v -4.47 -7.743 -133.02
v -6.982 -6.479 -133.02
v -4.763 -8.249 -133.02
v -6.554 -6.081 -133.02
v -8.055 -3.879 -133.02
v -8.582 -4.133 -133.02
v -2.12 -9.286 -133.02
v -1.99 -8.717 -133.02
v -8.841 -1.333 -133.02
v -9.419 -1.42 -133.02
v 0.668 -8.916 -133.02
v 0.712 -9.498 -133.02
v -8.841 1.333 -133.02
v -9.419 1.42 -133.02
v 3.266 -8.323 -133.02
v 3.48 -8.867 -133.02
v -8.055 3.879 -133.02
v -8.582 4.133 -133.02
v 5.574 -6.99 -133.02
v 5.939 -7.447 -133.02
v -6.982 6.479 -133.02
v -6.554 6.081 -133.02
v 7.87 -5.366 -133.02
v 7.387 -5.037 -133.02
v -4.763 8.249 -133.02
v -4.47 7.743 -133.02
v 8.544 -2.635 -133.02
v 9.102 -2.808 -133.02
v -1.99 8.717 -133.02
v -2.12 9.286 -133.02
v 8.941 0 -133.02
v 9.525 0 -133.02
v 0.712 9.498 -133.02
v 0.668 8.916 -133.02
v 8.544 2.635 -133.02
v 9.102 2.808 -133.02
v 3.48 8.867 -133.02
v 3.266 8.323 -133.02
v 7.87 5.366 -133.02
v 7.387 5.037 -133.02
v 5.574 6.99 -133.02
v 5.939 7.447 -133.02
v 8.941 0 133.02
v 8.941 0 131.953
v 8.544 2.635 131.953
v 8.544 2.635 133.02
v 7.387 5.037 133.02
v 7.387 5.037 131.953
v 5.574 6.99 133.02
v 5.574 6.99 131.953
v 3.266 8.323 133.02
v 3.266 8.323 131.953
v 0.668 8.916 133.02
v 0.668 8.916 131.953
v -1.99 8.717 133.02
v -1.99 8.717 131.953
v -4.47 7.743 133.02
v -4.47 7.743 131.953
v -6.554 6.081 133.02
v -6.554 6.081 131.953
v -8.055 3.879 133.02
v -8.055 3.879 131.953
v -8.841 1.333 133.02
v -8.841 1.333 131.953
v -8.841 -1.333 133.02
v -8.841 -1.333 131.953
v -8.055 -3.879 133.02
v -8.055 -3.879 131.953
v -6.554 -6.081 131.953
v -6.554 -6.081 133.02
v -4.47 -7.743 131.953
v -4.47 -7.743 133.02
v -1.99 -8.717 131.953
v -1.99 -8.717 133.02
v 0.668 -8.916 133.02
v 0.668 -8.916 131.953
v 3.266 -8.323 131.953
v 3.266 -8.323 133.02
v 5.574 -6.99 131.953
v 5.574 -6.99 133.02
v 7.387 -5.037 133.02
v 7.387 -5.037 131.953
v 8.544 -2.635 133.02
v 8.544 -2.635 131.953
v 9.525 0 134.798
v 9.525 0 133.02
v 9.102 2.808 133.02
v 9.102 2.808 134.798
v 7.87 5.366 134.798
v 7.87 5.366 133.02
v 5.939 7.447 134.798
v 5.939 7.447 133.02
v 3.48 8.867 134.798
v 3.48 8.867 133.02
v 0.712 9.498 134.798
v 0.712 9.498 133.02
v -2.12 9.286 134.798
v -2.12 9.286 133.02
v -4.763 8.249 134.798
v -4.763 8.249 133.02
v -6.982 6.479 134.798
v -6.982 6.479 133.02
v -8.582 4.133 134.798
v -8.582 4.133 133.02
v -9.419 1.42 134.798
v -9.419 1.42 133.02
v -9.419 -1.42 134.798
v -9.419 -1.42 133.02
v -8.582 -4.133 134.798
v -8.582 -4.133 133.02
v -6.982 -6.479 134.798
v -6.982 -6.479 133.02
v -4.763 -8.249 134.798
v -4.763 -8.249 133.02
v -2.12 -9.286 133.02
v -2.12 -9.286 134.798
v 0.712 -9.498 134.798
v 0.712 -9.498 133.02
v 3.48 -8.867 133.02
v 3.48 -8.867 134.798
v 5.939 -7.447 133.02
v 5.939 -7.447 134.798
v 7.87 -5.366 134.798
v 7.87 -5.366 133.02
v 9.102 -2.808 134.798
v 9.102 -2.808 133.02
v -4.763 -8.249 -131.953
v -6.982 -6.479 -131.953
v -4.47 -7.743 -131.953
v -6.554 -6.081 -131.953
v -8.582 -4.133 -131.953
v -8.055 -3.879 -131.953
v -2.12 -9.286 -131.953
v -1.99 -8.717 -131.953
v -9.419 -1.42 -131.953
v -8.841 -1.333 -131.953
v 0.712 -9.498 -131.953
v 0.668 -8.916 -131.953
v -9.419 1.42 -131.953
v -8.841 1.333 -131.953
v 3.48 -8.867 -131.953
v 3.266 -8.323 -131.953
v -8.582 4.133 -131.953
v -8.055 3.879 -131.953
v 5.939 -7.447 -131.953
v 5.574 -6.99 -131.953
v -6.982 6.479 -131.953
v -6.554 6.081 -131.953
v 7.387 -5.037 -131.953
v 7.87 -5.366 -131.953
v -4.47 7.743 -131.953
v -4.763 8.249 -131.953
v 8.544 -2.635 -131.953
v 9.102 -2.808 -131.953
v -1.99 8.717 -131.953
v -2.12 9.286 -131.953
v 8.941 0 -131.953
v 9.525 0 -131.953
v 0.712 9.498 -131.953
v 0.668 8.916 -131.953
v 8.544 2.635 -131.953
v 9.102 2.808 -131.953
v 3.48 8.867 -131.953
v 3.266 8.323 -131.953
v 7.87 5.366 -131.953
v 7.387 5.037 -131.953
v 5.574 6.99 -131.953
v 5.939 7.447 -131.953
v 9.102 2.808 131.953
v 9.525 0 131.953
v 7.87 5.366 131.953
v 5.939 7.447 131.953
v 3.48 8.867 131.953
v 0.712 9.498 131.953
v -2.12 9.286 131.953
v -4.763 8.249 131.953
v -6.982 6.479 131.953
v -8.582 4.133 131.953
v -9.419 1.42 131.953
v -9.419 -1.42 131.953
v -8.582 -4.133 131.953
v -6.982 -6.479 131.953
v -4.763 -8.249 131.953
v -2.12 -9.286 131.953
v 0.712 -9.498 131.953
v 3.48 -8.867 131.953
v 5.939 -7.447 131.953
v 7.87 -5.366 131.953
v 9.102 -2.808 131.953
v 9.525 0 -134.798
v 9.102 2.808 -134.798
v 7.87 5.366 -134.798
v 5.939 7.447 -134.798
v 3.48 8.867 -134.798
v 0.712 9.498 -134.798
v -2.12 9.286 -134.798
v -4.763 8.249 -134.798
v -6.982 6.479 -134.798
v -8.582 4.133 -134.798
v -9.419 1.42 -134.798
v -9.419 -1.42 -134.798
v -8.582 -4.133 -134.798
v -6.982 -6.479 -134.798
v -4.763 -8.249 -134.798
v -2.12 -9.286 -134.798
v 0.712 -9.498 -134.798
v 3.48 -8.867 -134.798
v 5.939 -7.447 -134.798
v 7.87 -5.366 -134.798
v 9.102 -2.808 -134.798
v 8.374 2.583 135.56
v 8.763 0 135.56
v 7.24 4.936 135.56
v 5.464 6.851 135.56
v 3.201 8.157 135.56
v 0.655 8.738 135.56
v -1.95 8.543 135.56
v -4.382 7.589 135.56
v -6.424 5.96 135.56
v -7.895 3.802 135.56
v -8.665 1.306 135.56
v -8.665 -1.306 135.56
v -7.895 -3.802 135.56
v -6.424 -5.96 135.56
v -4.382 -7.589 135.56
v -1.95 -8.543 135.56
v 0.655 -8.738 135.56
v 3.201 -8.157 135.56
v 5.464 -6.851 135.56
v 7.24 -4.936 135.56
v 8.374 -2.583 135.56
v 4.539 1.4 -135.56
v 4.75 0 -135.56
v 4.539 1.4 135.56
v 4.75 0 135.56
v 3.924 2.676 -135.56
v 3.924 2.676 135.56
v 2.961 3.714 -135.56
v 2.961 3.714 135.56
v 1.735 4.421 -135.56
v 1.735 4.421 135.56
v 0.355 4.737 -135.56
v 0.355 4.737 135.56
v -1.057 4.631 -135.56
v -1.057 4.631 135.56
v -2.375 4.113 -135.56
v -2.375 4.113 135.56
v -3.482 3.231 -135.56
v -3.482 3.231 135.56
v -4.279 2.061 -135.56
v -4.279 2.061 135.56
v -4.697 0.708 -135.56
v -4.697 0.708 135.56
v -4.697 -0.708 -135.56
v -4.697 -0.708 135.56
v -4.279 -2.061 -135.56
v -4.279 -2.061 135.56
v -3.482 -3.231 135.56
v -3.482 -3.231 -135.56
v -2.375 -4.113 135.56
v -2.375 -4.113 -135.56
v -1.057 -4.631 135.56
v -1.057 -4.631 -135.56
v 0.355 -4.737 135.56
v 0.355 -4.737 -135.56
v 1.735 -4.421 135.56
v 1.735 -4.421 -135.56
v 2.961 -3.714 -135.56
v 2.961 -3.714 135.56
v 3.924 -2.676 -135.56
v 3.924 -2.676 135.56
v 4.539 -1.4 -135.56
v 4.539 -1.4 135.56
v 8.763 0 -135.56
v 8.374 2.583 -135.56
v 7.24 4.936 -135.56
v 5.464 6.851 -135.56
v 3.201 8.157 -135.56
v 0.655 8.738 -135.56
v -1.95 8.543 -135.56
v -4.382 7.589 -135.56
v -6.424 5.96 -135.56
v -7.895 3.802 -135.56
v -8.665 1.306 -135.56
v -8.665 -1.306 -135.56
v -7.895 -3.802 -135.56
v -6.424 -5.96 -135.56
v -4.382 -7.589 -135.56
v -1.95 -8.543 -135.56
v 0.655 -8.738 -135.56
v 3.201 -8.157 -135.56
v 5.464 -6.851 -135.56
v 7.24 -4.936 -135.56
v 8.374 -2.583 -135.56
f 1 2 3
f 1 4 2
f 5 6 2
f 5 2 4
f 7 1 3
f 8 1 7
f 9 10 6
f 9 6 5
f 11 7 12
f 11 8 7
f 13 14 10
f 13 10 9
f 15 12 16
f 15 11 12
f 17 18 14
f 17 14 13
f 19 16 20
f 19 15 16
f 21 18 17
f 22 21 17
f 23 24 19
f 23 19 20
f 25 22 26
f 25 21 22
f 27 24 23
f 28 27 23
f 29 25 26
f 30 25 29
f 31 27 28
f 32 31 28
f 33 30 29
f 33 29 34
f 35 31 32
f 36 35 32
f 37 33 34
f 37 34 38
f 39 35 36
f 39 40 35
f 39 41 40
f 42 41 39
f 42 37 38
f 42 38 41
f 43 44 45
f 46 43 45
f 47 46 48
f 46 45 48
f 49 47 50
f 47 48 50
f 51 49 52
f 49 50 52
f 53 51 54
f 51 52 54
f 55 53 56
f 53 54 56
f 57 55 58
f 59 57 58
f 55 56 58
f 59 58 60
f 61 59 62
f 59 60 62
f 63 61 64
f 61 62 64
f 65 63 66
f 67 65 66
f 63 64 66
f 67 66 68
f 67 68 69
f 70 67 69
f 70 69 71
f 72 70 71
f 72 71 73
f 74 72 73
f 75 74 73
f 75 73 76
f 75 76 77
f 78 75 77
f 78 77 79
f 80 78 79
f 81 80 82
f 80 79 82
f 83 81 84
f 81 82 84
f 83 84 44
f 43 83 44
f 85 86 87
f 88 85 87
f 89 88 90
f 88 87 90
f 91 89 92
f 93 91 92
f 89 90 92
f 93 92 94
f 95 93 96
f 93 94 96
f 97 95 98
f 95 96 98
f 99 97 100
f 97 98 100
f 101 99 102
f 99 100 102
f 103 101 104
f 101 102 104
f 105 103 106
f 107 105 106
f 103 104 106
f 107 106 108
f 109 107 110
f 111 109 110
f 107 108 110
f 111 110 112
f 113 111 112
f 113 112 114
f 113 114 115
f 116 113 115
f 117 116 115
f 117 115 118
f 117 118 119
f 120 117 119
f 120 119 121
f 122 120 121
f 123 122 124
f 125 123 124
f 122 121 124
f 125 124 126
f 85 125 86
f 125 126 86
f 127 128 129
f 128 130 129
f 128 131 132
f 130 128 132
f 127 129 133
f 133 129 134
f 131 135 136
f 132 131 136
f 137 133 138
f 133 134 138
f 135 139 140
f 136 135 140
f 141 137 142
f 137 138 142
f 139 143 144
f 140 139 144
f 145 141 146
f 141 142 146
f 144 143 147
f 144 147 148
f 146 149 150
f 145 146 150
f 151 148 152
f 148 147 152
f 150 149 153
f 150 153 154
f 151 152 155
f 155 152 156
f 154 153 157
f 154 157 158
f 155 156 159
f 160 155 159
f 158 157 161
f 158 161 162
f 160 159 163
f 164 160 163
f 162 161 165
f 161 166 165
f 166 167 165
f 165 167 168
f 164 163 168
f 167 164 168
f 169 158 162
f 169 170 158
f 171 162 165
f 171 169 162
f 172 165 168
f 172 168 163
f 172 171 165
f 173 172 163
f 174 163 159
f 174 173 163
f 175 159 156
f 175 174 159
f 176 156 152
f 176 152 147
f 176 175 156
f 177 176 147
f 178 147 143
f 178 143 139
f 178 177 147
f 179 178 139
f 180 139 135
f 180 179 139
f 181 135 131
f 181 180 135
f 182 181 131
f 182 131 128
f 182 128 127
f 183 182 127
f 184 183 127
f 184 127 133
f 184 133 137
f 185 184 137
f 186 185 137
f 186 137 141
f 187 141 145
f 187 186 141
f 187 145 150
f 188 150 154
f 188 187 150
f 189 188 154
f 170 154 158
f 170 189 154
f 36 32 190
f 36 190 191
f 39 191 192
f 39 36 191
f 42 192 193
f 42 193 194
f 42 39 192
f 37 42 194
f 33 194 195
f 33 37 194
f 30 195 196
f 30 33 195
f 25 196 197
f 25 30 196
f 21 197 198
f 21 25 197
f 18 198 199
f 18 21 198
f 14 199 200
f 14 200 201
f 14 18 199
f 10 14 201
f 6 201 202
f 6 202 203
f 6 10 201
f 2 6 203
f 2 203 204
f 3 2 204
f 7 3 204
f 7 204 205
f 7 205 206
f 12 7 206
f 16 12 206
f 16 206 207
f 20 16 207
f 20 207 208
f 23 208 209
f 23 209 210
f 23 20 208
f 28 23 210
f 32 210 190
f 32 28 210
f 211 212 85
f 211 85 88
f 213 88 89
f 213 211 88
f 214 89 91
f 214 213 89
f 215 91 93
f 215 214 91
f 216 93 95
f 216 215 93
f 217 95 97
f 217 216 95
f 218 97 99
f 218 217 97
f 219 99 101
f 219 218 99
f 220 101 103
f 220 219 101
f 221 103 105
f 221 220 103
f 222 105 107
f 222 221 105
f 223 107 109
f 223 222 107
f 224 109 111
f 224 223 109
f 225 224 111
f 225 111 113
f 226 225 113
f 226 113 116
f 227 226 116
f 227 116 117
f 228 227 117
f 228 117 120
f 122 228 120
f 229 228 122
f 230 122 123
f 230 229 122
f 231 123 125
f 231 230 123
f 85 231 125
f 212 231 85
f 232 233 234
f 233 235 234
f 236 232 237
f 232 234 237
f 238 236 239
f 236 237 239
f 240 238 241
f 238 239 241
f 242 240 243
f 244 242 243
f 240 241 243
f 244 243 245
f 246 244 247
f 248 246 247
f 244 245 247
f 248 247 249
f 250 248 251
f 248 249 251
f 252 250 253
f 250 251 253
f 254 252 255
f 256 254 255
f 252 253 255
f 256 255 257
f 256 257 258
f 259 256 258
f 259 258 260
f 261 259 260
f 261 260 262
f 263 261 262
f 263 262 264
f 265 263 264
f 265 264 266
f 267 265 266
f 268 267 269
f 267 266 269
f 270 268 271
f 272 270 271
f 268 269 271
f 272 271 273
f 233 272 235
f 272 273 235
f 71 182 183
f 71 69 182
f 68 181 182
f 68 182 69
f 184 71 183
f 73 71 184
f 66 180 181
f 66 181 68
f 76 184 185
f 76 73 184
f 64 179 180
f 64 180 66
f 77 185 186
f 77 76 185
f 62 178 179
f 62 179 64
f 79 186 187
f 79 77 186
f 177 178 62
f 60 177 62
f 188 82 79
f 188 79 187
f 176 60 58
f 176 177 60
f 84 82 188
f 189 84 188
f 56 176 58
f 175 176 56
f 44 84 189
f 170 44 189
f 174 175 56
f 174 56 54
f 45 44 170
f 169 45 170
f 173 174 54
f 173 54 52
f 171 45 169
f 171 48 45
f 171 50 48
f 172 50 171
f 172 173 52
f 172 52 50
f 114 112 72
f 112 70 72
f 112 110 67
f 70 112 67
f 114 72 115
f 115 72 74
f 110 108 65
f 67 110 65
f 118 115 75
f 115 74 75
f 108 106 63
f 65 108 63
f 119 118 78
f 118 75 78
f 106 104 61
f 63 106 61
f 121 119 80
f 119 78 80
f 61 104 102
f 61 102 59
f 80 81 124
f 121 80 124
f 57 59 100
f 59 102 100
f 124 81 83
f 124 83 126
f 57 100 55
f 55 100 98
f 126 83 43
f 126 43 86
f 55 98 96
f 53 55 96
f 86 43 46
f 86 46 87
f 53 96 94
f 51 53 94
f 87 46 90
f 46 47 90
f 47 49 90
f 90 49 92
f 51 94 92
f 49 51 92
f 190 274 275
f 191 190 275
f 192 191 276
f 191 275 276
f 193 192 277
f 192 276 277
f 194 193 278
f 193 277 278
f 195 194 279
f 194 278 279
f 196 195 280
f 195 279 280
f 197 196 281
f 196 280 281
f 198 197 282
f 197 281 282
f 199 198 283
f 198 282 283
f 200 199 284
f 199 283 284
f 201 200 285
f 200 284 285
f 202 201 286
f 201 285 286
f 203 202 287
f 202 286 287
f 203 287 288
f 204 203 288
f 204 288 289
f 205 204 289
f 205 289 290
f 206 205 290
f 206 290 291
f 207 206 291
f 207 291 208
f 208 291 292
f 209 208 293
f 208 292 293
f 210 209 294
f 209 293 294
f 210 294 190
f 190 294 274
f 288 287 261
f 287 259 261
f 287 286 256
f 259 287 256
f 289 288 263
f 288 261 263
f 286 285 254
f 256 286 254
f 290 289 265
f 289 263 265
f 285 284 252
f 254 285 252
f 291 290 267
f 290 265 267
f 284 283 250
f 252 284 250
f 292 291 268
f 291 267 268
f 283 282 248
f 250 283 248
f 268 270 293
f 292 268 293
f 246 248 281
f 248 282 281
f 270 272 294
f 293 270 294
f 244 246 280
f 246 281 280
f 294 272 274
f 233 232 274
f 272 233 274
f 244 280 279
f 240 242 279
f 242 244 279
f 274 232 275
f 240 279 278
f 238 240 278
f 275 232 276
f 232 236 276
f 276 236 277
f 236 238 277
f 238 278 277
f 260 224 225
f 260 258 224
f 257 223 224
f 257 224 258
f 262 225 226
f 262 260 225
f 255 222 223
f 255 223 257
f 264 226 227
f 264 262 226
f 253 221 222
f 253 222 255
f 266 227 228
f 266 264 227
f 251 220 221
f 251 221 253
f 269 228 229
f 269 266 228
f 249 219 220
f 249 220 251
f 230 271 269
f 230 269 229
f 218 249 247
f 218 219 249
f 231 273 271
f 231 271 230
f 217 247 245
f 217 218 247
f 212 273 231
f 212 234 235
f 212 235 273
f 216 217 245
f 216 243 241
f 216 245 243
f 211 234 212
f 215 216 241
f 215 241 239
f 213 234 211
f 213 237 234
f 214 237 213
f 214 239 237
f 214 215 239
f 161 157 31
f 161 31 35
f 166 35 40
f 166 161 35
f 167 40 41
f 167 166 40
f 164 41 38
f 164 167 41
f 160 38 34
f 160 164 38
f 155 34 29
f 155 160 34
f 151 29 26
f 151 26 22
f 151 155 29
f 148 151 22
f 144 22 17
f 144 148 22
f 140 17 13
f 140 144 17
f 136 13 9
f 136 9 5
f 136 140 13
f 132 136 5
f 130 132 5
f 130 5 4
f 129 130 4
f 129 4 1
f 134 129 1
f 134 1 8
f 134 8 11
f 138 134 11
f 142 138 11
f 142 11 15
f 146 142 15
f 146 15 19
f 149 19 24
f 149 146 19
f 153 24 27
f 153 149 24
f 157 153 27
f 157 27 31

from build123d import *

# Parameters (mm, degrees)
SKETCH1_R                = 9.525
SKETCH1_R_2              = 4.7498
BOSS_EXTRUDE1_DEPTH      = 131.953
SKETCH2_R                = 8.9408
SKETCH2_R_2              = 4.7498
BOSS_EXTRUDE2_DEPTH      = 1.0668
SKETCH4_R                = 9.525
SKETCH4_R_2              = 4.7498
BOSS_EXTRUDE4_DEPTH      = 2.54
CHAMFER1_SIZE            = 0.762
CHAMFER1_OF_MIRROR1_SIZE = 0.762


with BuildPart() as part:
    # Sketch1 → Boss-Extrude1 (new, symmetric)
    with BuildSketch(Plane.XY):
        Circle(SKETCH1_R)
        Circle(SKETCH1_R_2, mode=Mode.SUBTRACT)
    extrude(amount=BOSS_EXTRUDE1_DEPTH, both=True)

    # Sketch2 → Boss-Extrude2 (add)
    with BuildSketch(Plane.XY.offset(131.953)):
        Circle(SKETCH2_R)
        Circle(SKETCH2_R_2, mode=Mode.SUBTRACT)
    boss_extrude2 = extrude(amount=BOSS_EXTRUDE2_DEPTH)

    # Sketch4 → Boss-Extrude4 (add)
    with BuildSketch(Plane.XY.offset(133.0198)):
        Circle(SKETCH4_R)
        Circle(SKETCH4_R_2, mode=Mode.SUBTRACT)
    boss_extrude4 = extrude(amount=BOSS_EXTRUDE4_DEPTH)

    # Chamfer1
    chamfer1_edges = [part.edges().sort_by_distance(p)[0] for p in [
        (-9.525, 0, 135.5598),
    ]]
    chamfer(chamfer1_edges, length=CHAMFER1_SIZE)

    # Mirror1: Boss-Extrude2, Boss-Extrude4 across plane
    add(boss_extrude2.mirror(Plane.XY))
    add(boss_extrude4.mirror(Plane.XY))

    # Chamfer1 of Mirror1
    chamfer1_of_mirror1_edges = [part.edges().sort_by_distance(p)[0] for p in [
        (-9.525, 0, -135.5598),
    ]]
    chamfer(chamfer1_of_mirror1_edges, length=CHAMFER1_OF_MIRROR1_SIZE)


solid = part.part
